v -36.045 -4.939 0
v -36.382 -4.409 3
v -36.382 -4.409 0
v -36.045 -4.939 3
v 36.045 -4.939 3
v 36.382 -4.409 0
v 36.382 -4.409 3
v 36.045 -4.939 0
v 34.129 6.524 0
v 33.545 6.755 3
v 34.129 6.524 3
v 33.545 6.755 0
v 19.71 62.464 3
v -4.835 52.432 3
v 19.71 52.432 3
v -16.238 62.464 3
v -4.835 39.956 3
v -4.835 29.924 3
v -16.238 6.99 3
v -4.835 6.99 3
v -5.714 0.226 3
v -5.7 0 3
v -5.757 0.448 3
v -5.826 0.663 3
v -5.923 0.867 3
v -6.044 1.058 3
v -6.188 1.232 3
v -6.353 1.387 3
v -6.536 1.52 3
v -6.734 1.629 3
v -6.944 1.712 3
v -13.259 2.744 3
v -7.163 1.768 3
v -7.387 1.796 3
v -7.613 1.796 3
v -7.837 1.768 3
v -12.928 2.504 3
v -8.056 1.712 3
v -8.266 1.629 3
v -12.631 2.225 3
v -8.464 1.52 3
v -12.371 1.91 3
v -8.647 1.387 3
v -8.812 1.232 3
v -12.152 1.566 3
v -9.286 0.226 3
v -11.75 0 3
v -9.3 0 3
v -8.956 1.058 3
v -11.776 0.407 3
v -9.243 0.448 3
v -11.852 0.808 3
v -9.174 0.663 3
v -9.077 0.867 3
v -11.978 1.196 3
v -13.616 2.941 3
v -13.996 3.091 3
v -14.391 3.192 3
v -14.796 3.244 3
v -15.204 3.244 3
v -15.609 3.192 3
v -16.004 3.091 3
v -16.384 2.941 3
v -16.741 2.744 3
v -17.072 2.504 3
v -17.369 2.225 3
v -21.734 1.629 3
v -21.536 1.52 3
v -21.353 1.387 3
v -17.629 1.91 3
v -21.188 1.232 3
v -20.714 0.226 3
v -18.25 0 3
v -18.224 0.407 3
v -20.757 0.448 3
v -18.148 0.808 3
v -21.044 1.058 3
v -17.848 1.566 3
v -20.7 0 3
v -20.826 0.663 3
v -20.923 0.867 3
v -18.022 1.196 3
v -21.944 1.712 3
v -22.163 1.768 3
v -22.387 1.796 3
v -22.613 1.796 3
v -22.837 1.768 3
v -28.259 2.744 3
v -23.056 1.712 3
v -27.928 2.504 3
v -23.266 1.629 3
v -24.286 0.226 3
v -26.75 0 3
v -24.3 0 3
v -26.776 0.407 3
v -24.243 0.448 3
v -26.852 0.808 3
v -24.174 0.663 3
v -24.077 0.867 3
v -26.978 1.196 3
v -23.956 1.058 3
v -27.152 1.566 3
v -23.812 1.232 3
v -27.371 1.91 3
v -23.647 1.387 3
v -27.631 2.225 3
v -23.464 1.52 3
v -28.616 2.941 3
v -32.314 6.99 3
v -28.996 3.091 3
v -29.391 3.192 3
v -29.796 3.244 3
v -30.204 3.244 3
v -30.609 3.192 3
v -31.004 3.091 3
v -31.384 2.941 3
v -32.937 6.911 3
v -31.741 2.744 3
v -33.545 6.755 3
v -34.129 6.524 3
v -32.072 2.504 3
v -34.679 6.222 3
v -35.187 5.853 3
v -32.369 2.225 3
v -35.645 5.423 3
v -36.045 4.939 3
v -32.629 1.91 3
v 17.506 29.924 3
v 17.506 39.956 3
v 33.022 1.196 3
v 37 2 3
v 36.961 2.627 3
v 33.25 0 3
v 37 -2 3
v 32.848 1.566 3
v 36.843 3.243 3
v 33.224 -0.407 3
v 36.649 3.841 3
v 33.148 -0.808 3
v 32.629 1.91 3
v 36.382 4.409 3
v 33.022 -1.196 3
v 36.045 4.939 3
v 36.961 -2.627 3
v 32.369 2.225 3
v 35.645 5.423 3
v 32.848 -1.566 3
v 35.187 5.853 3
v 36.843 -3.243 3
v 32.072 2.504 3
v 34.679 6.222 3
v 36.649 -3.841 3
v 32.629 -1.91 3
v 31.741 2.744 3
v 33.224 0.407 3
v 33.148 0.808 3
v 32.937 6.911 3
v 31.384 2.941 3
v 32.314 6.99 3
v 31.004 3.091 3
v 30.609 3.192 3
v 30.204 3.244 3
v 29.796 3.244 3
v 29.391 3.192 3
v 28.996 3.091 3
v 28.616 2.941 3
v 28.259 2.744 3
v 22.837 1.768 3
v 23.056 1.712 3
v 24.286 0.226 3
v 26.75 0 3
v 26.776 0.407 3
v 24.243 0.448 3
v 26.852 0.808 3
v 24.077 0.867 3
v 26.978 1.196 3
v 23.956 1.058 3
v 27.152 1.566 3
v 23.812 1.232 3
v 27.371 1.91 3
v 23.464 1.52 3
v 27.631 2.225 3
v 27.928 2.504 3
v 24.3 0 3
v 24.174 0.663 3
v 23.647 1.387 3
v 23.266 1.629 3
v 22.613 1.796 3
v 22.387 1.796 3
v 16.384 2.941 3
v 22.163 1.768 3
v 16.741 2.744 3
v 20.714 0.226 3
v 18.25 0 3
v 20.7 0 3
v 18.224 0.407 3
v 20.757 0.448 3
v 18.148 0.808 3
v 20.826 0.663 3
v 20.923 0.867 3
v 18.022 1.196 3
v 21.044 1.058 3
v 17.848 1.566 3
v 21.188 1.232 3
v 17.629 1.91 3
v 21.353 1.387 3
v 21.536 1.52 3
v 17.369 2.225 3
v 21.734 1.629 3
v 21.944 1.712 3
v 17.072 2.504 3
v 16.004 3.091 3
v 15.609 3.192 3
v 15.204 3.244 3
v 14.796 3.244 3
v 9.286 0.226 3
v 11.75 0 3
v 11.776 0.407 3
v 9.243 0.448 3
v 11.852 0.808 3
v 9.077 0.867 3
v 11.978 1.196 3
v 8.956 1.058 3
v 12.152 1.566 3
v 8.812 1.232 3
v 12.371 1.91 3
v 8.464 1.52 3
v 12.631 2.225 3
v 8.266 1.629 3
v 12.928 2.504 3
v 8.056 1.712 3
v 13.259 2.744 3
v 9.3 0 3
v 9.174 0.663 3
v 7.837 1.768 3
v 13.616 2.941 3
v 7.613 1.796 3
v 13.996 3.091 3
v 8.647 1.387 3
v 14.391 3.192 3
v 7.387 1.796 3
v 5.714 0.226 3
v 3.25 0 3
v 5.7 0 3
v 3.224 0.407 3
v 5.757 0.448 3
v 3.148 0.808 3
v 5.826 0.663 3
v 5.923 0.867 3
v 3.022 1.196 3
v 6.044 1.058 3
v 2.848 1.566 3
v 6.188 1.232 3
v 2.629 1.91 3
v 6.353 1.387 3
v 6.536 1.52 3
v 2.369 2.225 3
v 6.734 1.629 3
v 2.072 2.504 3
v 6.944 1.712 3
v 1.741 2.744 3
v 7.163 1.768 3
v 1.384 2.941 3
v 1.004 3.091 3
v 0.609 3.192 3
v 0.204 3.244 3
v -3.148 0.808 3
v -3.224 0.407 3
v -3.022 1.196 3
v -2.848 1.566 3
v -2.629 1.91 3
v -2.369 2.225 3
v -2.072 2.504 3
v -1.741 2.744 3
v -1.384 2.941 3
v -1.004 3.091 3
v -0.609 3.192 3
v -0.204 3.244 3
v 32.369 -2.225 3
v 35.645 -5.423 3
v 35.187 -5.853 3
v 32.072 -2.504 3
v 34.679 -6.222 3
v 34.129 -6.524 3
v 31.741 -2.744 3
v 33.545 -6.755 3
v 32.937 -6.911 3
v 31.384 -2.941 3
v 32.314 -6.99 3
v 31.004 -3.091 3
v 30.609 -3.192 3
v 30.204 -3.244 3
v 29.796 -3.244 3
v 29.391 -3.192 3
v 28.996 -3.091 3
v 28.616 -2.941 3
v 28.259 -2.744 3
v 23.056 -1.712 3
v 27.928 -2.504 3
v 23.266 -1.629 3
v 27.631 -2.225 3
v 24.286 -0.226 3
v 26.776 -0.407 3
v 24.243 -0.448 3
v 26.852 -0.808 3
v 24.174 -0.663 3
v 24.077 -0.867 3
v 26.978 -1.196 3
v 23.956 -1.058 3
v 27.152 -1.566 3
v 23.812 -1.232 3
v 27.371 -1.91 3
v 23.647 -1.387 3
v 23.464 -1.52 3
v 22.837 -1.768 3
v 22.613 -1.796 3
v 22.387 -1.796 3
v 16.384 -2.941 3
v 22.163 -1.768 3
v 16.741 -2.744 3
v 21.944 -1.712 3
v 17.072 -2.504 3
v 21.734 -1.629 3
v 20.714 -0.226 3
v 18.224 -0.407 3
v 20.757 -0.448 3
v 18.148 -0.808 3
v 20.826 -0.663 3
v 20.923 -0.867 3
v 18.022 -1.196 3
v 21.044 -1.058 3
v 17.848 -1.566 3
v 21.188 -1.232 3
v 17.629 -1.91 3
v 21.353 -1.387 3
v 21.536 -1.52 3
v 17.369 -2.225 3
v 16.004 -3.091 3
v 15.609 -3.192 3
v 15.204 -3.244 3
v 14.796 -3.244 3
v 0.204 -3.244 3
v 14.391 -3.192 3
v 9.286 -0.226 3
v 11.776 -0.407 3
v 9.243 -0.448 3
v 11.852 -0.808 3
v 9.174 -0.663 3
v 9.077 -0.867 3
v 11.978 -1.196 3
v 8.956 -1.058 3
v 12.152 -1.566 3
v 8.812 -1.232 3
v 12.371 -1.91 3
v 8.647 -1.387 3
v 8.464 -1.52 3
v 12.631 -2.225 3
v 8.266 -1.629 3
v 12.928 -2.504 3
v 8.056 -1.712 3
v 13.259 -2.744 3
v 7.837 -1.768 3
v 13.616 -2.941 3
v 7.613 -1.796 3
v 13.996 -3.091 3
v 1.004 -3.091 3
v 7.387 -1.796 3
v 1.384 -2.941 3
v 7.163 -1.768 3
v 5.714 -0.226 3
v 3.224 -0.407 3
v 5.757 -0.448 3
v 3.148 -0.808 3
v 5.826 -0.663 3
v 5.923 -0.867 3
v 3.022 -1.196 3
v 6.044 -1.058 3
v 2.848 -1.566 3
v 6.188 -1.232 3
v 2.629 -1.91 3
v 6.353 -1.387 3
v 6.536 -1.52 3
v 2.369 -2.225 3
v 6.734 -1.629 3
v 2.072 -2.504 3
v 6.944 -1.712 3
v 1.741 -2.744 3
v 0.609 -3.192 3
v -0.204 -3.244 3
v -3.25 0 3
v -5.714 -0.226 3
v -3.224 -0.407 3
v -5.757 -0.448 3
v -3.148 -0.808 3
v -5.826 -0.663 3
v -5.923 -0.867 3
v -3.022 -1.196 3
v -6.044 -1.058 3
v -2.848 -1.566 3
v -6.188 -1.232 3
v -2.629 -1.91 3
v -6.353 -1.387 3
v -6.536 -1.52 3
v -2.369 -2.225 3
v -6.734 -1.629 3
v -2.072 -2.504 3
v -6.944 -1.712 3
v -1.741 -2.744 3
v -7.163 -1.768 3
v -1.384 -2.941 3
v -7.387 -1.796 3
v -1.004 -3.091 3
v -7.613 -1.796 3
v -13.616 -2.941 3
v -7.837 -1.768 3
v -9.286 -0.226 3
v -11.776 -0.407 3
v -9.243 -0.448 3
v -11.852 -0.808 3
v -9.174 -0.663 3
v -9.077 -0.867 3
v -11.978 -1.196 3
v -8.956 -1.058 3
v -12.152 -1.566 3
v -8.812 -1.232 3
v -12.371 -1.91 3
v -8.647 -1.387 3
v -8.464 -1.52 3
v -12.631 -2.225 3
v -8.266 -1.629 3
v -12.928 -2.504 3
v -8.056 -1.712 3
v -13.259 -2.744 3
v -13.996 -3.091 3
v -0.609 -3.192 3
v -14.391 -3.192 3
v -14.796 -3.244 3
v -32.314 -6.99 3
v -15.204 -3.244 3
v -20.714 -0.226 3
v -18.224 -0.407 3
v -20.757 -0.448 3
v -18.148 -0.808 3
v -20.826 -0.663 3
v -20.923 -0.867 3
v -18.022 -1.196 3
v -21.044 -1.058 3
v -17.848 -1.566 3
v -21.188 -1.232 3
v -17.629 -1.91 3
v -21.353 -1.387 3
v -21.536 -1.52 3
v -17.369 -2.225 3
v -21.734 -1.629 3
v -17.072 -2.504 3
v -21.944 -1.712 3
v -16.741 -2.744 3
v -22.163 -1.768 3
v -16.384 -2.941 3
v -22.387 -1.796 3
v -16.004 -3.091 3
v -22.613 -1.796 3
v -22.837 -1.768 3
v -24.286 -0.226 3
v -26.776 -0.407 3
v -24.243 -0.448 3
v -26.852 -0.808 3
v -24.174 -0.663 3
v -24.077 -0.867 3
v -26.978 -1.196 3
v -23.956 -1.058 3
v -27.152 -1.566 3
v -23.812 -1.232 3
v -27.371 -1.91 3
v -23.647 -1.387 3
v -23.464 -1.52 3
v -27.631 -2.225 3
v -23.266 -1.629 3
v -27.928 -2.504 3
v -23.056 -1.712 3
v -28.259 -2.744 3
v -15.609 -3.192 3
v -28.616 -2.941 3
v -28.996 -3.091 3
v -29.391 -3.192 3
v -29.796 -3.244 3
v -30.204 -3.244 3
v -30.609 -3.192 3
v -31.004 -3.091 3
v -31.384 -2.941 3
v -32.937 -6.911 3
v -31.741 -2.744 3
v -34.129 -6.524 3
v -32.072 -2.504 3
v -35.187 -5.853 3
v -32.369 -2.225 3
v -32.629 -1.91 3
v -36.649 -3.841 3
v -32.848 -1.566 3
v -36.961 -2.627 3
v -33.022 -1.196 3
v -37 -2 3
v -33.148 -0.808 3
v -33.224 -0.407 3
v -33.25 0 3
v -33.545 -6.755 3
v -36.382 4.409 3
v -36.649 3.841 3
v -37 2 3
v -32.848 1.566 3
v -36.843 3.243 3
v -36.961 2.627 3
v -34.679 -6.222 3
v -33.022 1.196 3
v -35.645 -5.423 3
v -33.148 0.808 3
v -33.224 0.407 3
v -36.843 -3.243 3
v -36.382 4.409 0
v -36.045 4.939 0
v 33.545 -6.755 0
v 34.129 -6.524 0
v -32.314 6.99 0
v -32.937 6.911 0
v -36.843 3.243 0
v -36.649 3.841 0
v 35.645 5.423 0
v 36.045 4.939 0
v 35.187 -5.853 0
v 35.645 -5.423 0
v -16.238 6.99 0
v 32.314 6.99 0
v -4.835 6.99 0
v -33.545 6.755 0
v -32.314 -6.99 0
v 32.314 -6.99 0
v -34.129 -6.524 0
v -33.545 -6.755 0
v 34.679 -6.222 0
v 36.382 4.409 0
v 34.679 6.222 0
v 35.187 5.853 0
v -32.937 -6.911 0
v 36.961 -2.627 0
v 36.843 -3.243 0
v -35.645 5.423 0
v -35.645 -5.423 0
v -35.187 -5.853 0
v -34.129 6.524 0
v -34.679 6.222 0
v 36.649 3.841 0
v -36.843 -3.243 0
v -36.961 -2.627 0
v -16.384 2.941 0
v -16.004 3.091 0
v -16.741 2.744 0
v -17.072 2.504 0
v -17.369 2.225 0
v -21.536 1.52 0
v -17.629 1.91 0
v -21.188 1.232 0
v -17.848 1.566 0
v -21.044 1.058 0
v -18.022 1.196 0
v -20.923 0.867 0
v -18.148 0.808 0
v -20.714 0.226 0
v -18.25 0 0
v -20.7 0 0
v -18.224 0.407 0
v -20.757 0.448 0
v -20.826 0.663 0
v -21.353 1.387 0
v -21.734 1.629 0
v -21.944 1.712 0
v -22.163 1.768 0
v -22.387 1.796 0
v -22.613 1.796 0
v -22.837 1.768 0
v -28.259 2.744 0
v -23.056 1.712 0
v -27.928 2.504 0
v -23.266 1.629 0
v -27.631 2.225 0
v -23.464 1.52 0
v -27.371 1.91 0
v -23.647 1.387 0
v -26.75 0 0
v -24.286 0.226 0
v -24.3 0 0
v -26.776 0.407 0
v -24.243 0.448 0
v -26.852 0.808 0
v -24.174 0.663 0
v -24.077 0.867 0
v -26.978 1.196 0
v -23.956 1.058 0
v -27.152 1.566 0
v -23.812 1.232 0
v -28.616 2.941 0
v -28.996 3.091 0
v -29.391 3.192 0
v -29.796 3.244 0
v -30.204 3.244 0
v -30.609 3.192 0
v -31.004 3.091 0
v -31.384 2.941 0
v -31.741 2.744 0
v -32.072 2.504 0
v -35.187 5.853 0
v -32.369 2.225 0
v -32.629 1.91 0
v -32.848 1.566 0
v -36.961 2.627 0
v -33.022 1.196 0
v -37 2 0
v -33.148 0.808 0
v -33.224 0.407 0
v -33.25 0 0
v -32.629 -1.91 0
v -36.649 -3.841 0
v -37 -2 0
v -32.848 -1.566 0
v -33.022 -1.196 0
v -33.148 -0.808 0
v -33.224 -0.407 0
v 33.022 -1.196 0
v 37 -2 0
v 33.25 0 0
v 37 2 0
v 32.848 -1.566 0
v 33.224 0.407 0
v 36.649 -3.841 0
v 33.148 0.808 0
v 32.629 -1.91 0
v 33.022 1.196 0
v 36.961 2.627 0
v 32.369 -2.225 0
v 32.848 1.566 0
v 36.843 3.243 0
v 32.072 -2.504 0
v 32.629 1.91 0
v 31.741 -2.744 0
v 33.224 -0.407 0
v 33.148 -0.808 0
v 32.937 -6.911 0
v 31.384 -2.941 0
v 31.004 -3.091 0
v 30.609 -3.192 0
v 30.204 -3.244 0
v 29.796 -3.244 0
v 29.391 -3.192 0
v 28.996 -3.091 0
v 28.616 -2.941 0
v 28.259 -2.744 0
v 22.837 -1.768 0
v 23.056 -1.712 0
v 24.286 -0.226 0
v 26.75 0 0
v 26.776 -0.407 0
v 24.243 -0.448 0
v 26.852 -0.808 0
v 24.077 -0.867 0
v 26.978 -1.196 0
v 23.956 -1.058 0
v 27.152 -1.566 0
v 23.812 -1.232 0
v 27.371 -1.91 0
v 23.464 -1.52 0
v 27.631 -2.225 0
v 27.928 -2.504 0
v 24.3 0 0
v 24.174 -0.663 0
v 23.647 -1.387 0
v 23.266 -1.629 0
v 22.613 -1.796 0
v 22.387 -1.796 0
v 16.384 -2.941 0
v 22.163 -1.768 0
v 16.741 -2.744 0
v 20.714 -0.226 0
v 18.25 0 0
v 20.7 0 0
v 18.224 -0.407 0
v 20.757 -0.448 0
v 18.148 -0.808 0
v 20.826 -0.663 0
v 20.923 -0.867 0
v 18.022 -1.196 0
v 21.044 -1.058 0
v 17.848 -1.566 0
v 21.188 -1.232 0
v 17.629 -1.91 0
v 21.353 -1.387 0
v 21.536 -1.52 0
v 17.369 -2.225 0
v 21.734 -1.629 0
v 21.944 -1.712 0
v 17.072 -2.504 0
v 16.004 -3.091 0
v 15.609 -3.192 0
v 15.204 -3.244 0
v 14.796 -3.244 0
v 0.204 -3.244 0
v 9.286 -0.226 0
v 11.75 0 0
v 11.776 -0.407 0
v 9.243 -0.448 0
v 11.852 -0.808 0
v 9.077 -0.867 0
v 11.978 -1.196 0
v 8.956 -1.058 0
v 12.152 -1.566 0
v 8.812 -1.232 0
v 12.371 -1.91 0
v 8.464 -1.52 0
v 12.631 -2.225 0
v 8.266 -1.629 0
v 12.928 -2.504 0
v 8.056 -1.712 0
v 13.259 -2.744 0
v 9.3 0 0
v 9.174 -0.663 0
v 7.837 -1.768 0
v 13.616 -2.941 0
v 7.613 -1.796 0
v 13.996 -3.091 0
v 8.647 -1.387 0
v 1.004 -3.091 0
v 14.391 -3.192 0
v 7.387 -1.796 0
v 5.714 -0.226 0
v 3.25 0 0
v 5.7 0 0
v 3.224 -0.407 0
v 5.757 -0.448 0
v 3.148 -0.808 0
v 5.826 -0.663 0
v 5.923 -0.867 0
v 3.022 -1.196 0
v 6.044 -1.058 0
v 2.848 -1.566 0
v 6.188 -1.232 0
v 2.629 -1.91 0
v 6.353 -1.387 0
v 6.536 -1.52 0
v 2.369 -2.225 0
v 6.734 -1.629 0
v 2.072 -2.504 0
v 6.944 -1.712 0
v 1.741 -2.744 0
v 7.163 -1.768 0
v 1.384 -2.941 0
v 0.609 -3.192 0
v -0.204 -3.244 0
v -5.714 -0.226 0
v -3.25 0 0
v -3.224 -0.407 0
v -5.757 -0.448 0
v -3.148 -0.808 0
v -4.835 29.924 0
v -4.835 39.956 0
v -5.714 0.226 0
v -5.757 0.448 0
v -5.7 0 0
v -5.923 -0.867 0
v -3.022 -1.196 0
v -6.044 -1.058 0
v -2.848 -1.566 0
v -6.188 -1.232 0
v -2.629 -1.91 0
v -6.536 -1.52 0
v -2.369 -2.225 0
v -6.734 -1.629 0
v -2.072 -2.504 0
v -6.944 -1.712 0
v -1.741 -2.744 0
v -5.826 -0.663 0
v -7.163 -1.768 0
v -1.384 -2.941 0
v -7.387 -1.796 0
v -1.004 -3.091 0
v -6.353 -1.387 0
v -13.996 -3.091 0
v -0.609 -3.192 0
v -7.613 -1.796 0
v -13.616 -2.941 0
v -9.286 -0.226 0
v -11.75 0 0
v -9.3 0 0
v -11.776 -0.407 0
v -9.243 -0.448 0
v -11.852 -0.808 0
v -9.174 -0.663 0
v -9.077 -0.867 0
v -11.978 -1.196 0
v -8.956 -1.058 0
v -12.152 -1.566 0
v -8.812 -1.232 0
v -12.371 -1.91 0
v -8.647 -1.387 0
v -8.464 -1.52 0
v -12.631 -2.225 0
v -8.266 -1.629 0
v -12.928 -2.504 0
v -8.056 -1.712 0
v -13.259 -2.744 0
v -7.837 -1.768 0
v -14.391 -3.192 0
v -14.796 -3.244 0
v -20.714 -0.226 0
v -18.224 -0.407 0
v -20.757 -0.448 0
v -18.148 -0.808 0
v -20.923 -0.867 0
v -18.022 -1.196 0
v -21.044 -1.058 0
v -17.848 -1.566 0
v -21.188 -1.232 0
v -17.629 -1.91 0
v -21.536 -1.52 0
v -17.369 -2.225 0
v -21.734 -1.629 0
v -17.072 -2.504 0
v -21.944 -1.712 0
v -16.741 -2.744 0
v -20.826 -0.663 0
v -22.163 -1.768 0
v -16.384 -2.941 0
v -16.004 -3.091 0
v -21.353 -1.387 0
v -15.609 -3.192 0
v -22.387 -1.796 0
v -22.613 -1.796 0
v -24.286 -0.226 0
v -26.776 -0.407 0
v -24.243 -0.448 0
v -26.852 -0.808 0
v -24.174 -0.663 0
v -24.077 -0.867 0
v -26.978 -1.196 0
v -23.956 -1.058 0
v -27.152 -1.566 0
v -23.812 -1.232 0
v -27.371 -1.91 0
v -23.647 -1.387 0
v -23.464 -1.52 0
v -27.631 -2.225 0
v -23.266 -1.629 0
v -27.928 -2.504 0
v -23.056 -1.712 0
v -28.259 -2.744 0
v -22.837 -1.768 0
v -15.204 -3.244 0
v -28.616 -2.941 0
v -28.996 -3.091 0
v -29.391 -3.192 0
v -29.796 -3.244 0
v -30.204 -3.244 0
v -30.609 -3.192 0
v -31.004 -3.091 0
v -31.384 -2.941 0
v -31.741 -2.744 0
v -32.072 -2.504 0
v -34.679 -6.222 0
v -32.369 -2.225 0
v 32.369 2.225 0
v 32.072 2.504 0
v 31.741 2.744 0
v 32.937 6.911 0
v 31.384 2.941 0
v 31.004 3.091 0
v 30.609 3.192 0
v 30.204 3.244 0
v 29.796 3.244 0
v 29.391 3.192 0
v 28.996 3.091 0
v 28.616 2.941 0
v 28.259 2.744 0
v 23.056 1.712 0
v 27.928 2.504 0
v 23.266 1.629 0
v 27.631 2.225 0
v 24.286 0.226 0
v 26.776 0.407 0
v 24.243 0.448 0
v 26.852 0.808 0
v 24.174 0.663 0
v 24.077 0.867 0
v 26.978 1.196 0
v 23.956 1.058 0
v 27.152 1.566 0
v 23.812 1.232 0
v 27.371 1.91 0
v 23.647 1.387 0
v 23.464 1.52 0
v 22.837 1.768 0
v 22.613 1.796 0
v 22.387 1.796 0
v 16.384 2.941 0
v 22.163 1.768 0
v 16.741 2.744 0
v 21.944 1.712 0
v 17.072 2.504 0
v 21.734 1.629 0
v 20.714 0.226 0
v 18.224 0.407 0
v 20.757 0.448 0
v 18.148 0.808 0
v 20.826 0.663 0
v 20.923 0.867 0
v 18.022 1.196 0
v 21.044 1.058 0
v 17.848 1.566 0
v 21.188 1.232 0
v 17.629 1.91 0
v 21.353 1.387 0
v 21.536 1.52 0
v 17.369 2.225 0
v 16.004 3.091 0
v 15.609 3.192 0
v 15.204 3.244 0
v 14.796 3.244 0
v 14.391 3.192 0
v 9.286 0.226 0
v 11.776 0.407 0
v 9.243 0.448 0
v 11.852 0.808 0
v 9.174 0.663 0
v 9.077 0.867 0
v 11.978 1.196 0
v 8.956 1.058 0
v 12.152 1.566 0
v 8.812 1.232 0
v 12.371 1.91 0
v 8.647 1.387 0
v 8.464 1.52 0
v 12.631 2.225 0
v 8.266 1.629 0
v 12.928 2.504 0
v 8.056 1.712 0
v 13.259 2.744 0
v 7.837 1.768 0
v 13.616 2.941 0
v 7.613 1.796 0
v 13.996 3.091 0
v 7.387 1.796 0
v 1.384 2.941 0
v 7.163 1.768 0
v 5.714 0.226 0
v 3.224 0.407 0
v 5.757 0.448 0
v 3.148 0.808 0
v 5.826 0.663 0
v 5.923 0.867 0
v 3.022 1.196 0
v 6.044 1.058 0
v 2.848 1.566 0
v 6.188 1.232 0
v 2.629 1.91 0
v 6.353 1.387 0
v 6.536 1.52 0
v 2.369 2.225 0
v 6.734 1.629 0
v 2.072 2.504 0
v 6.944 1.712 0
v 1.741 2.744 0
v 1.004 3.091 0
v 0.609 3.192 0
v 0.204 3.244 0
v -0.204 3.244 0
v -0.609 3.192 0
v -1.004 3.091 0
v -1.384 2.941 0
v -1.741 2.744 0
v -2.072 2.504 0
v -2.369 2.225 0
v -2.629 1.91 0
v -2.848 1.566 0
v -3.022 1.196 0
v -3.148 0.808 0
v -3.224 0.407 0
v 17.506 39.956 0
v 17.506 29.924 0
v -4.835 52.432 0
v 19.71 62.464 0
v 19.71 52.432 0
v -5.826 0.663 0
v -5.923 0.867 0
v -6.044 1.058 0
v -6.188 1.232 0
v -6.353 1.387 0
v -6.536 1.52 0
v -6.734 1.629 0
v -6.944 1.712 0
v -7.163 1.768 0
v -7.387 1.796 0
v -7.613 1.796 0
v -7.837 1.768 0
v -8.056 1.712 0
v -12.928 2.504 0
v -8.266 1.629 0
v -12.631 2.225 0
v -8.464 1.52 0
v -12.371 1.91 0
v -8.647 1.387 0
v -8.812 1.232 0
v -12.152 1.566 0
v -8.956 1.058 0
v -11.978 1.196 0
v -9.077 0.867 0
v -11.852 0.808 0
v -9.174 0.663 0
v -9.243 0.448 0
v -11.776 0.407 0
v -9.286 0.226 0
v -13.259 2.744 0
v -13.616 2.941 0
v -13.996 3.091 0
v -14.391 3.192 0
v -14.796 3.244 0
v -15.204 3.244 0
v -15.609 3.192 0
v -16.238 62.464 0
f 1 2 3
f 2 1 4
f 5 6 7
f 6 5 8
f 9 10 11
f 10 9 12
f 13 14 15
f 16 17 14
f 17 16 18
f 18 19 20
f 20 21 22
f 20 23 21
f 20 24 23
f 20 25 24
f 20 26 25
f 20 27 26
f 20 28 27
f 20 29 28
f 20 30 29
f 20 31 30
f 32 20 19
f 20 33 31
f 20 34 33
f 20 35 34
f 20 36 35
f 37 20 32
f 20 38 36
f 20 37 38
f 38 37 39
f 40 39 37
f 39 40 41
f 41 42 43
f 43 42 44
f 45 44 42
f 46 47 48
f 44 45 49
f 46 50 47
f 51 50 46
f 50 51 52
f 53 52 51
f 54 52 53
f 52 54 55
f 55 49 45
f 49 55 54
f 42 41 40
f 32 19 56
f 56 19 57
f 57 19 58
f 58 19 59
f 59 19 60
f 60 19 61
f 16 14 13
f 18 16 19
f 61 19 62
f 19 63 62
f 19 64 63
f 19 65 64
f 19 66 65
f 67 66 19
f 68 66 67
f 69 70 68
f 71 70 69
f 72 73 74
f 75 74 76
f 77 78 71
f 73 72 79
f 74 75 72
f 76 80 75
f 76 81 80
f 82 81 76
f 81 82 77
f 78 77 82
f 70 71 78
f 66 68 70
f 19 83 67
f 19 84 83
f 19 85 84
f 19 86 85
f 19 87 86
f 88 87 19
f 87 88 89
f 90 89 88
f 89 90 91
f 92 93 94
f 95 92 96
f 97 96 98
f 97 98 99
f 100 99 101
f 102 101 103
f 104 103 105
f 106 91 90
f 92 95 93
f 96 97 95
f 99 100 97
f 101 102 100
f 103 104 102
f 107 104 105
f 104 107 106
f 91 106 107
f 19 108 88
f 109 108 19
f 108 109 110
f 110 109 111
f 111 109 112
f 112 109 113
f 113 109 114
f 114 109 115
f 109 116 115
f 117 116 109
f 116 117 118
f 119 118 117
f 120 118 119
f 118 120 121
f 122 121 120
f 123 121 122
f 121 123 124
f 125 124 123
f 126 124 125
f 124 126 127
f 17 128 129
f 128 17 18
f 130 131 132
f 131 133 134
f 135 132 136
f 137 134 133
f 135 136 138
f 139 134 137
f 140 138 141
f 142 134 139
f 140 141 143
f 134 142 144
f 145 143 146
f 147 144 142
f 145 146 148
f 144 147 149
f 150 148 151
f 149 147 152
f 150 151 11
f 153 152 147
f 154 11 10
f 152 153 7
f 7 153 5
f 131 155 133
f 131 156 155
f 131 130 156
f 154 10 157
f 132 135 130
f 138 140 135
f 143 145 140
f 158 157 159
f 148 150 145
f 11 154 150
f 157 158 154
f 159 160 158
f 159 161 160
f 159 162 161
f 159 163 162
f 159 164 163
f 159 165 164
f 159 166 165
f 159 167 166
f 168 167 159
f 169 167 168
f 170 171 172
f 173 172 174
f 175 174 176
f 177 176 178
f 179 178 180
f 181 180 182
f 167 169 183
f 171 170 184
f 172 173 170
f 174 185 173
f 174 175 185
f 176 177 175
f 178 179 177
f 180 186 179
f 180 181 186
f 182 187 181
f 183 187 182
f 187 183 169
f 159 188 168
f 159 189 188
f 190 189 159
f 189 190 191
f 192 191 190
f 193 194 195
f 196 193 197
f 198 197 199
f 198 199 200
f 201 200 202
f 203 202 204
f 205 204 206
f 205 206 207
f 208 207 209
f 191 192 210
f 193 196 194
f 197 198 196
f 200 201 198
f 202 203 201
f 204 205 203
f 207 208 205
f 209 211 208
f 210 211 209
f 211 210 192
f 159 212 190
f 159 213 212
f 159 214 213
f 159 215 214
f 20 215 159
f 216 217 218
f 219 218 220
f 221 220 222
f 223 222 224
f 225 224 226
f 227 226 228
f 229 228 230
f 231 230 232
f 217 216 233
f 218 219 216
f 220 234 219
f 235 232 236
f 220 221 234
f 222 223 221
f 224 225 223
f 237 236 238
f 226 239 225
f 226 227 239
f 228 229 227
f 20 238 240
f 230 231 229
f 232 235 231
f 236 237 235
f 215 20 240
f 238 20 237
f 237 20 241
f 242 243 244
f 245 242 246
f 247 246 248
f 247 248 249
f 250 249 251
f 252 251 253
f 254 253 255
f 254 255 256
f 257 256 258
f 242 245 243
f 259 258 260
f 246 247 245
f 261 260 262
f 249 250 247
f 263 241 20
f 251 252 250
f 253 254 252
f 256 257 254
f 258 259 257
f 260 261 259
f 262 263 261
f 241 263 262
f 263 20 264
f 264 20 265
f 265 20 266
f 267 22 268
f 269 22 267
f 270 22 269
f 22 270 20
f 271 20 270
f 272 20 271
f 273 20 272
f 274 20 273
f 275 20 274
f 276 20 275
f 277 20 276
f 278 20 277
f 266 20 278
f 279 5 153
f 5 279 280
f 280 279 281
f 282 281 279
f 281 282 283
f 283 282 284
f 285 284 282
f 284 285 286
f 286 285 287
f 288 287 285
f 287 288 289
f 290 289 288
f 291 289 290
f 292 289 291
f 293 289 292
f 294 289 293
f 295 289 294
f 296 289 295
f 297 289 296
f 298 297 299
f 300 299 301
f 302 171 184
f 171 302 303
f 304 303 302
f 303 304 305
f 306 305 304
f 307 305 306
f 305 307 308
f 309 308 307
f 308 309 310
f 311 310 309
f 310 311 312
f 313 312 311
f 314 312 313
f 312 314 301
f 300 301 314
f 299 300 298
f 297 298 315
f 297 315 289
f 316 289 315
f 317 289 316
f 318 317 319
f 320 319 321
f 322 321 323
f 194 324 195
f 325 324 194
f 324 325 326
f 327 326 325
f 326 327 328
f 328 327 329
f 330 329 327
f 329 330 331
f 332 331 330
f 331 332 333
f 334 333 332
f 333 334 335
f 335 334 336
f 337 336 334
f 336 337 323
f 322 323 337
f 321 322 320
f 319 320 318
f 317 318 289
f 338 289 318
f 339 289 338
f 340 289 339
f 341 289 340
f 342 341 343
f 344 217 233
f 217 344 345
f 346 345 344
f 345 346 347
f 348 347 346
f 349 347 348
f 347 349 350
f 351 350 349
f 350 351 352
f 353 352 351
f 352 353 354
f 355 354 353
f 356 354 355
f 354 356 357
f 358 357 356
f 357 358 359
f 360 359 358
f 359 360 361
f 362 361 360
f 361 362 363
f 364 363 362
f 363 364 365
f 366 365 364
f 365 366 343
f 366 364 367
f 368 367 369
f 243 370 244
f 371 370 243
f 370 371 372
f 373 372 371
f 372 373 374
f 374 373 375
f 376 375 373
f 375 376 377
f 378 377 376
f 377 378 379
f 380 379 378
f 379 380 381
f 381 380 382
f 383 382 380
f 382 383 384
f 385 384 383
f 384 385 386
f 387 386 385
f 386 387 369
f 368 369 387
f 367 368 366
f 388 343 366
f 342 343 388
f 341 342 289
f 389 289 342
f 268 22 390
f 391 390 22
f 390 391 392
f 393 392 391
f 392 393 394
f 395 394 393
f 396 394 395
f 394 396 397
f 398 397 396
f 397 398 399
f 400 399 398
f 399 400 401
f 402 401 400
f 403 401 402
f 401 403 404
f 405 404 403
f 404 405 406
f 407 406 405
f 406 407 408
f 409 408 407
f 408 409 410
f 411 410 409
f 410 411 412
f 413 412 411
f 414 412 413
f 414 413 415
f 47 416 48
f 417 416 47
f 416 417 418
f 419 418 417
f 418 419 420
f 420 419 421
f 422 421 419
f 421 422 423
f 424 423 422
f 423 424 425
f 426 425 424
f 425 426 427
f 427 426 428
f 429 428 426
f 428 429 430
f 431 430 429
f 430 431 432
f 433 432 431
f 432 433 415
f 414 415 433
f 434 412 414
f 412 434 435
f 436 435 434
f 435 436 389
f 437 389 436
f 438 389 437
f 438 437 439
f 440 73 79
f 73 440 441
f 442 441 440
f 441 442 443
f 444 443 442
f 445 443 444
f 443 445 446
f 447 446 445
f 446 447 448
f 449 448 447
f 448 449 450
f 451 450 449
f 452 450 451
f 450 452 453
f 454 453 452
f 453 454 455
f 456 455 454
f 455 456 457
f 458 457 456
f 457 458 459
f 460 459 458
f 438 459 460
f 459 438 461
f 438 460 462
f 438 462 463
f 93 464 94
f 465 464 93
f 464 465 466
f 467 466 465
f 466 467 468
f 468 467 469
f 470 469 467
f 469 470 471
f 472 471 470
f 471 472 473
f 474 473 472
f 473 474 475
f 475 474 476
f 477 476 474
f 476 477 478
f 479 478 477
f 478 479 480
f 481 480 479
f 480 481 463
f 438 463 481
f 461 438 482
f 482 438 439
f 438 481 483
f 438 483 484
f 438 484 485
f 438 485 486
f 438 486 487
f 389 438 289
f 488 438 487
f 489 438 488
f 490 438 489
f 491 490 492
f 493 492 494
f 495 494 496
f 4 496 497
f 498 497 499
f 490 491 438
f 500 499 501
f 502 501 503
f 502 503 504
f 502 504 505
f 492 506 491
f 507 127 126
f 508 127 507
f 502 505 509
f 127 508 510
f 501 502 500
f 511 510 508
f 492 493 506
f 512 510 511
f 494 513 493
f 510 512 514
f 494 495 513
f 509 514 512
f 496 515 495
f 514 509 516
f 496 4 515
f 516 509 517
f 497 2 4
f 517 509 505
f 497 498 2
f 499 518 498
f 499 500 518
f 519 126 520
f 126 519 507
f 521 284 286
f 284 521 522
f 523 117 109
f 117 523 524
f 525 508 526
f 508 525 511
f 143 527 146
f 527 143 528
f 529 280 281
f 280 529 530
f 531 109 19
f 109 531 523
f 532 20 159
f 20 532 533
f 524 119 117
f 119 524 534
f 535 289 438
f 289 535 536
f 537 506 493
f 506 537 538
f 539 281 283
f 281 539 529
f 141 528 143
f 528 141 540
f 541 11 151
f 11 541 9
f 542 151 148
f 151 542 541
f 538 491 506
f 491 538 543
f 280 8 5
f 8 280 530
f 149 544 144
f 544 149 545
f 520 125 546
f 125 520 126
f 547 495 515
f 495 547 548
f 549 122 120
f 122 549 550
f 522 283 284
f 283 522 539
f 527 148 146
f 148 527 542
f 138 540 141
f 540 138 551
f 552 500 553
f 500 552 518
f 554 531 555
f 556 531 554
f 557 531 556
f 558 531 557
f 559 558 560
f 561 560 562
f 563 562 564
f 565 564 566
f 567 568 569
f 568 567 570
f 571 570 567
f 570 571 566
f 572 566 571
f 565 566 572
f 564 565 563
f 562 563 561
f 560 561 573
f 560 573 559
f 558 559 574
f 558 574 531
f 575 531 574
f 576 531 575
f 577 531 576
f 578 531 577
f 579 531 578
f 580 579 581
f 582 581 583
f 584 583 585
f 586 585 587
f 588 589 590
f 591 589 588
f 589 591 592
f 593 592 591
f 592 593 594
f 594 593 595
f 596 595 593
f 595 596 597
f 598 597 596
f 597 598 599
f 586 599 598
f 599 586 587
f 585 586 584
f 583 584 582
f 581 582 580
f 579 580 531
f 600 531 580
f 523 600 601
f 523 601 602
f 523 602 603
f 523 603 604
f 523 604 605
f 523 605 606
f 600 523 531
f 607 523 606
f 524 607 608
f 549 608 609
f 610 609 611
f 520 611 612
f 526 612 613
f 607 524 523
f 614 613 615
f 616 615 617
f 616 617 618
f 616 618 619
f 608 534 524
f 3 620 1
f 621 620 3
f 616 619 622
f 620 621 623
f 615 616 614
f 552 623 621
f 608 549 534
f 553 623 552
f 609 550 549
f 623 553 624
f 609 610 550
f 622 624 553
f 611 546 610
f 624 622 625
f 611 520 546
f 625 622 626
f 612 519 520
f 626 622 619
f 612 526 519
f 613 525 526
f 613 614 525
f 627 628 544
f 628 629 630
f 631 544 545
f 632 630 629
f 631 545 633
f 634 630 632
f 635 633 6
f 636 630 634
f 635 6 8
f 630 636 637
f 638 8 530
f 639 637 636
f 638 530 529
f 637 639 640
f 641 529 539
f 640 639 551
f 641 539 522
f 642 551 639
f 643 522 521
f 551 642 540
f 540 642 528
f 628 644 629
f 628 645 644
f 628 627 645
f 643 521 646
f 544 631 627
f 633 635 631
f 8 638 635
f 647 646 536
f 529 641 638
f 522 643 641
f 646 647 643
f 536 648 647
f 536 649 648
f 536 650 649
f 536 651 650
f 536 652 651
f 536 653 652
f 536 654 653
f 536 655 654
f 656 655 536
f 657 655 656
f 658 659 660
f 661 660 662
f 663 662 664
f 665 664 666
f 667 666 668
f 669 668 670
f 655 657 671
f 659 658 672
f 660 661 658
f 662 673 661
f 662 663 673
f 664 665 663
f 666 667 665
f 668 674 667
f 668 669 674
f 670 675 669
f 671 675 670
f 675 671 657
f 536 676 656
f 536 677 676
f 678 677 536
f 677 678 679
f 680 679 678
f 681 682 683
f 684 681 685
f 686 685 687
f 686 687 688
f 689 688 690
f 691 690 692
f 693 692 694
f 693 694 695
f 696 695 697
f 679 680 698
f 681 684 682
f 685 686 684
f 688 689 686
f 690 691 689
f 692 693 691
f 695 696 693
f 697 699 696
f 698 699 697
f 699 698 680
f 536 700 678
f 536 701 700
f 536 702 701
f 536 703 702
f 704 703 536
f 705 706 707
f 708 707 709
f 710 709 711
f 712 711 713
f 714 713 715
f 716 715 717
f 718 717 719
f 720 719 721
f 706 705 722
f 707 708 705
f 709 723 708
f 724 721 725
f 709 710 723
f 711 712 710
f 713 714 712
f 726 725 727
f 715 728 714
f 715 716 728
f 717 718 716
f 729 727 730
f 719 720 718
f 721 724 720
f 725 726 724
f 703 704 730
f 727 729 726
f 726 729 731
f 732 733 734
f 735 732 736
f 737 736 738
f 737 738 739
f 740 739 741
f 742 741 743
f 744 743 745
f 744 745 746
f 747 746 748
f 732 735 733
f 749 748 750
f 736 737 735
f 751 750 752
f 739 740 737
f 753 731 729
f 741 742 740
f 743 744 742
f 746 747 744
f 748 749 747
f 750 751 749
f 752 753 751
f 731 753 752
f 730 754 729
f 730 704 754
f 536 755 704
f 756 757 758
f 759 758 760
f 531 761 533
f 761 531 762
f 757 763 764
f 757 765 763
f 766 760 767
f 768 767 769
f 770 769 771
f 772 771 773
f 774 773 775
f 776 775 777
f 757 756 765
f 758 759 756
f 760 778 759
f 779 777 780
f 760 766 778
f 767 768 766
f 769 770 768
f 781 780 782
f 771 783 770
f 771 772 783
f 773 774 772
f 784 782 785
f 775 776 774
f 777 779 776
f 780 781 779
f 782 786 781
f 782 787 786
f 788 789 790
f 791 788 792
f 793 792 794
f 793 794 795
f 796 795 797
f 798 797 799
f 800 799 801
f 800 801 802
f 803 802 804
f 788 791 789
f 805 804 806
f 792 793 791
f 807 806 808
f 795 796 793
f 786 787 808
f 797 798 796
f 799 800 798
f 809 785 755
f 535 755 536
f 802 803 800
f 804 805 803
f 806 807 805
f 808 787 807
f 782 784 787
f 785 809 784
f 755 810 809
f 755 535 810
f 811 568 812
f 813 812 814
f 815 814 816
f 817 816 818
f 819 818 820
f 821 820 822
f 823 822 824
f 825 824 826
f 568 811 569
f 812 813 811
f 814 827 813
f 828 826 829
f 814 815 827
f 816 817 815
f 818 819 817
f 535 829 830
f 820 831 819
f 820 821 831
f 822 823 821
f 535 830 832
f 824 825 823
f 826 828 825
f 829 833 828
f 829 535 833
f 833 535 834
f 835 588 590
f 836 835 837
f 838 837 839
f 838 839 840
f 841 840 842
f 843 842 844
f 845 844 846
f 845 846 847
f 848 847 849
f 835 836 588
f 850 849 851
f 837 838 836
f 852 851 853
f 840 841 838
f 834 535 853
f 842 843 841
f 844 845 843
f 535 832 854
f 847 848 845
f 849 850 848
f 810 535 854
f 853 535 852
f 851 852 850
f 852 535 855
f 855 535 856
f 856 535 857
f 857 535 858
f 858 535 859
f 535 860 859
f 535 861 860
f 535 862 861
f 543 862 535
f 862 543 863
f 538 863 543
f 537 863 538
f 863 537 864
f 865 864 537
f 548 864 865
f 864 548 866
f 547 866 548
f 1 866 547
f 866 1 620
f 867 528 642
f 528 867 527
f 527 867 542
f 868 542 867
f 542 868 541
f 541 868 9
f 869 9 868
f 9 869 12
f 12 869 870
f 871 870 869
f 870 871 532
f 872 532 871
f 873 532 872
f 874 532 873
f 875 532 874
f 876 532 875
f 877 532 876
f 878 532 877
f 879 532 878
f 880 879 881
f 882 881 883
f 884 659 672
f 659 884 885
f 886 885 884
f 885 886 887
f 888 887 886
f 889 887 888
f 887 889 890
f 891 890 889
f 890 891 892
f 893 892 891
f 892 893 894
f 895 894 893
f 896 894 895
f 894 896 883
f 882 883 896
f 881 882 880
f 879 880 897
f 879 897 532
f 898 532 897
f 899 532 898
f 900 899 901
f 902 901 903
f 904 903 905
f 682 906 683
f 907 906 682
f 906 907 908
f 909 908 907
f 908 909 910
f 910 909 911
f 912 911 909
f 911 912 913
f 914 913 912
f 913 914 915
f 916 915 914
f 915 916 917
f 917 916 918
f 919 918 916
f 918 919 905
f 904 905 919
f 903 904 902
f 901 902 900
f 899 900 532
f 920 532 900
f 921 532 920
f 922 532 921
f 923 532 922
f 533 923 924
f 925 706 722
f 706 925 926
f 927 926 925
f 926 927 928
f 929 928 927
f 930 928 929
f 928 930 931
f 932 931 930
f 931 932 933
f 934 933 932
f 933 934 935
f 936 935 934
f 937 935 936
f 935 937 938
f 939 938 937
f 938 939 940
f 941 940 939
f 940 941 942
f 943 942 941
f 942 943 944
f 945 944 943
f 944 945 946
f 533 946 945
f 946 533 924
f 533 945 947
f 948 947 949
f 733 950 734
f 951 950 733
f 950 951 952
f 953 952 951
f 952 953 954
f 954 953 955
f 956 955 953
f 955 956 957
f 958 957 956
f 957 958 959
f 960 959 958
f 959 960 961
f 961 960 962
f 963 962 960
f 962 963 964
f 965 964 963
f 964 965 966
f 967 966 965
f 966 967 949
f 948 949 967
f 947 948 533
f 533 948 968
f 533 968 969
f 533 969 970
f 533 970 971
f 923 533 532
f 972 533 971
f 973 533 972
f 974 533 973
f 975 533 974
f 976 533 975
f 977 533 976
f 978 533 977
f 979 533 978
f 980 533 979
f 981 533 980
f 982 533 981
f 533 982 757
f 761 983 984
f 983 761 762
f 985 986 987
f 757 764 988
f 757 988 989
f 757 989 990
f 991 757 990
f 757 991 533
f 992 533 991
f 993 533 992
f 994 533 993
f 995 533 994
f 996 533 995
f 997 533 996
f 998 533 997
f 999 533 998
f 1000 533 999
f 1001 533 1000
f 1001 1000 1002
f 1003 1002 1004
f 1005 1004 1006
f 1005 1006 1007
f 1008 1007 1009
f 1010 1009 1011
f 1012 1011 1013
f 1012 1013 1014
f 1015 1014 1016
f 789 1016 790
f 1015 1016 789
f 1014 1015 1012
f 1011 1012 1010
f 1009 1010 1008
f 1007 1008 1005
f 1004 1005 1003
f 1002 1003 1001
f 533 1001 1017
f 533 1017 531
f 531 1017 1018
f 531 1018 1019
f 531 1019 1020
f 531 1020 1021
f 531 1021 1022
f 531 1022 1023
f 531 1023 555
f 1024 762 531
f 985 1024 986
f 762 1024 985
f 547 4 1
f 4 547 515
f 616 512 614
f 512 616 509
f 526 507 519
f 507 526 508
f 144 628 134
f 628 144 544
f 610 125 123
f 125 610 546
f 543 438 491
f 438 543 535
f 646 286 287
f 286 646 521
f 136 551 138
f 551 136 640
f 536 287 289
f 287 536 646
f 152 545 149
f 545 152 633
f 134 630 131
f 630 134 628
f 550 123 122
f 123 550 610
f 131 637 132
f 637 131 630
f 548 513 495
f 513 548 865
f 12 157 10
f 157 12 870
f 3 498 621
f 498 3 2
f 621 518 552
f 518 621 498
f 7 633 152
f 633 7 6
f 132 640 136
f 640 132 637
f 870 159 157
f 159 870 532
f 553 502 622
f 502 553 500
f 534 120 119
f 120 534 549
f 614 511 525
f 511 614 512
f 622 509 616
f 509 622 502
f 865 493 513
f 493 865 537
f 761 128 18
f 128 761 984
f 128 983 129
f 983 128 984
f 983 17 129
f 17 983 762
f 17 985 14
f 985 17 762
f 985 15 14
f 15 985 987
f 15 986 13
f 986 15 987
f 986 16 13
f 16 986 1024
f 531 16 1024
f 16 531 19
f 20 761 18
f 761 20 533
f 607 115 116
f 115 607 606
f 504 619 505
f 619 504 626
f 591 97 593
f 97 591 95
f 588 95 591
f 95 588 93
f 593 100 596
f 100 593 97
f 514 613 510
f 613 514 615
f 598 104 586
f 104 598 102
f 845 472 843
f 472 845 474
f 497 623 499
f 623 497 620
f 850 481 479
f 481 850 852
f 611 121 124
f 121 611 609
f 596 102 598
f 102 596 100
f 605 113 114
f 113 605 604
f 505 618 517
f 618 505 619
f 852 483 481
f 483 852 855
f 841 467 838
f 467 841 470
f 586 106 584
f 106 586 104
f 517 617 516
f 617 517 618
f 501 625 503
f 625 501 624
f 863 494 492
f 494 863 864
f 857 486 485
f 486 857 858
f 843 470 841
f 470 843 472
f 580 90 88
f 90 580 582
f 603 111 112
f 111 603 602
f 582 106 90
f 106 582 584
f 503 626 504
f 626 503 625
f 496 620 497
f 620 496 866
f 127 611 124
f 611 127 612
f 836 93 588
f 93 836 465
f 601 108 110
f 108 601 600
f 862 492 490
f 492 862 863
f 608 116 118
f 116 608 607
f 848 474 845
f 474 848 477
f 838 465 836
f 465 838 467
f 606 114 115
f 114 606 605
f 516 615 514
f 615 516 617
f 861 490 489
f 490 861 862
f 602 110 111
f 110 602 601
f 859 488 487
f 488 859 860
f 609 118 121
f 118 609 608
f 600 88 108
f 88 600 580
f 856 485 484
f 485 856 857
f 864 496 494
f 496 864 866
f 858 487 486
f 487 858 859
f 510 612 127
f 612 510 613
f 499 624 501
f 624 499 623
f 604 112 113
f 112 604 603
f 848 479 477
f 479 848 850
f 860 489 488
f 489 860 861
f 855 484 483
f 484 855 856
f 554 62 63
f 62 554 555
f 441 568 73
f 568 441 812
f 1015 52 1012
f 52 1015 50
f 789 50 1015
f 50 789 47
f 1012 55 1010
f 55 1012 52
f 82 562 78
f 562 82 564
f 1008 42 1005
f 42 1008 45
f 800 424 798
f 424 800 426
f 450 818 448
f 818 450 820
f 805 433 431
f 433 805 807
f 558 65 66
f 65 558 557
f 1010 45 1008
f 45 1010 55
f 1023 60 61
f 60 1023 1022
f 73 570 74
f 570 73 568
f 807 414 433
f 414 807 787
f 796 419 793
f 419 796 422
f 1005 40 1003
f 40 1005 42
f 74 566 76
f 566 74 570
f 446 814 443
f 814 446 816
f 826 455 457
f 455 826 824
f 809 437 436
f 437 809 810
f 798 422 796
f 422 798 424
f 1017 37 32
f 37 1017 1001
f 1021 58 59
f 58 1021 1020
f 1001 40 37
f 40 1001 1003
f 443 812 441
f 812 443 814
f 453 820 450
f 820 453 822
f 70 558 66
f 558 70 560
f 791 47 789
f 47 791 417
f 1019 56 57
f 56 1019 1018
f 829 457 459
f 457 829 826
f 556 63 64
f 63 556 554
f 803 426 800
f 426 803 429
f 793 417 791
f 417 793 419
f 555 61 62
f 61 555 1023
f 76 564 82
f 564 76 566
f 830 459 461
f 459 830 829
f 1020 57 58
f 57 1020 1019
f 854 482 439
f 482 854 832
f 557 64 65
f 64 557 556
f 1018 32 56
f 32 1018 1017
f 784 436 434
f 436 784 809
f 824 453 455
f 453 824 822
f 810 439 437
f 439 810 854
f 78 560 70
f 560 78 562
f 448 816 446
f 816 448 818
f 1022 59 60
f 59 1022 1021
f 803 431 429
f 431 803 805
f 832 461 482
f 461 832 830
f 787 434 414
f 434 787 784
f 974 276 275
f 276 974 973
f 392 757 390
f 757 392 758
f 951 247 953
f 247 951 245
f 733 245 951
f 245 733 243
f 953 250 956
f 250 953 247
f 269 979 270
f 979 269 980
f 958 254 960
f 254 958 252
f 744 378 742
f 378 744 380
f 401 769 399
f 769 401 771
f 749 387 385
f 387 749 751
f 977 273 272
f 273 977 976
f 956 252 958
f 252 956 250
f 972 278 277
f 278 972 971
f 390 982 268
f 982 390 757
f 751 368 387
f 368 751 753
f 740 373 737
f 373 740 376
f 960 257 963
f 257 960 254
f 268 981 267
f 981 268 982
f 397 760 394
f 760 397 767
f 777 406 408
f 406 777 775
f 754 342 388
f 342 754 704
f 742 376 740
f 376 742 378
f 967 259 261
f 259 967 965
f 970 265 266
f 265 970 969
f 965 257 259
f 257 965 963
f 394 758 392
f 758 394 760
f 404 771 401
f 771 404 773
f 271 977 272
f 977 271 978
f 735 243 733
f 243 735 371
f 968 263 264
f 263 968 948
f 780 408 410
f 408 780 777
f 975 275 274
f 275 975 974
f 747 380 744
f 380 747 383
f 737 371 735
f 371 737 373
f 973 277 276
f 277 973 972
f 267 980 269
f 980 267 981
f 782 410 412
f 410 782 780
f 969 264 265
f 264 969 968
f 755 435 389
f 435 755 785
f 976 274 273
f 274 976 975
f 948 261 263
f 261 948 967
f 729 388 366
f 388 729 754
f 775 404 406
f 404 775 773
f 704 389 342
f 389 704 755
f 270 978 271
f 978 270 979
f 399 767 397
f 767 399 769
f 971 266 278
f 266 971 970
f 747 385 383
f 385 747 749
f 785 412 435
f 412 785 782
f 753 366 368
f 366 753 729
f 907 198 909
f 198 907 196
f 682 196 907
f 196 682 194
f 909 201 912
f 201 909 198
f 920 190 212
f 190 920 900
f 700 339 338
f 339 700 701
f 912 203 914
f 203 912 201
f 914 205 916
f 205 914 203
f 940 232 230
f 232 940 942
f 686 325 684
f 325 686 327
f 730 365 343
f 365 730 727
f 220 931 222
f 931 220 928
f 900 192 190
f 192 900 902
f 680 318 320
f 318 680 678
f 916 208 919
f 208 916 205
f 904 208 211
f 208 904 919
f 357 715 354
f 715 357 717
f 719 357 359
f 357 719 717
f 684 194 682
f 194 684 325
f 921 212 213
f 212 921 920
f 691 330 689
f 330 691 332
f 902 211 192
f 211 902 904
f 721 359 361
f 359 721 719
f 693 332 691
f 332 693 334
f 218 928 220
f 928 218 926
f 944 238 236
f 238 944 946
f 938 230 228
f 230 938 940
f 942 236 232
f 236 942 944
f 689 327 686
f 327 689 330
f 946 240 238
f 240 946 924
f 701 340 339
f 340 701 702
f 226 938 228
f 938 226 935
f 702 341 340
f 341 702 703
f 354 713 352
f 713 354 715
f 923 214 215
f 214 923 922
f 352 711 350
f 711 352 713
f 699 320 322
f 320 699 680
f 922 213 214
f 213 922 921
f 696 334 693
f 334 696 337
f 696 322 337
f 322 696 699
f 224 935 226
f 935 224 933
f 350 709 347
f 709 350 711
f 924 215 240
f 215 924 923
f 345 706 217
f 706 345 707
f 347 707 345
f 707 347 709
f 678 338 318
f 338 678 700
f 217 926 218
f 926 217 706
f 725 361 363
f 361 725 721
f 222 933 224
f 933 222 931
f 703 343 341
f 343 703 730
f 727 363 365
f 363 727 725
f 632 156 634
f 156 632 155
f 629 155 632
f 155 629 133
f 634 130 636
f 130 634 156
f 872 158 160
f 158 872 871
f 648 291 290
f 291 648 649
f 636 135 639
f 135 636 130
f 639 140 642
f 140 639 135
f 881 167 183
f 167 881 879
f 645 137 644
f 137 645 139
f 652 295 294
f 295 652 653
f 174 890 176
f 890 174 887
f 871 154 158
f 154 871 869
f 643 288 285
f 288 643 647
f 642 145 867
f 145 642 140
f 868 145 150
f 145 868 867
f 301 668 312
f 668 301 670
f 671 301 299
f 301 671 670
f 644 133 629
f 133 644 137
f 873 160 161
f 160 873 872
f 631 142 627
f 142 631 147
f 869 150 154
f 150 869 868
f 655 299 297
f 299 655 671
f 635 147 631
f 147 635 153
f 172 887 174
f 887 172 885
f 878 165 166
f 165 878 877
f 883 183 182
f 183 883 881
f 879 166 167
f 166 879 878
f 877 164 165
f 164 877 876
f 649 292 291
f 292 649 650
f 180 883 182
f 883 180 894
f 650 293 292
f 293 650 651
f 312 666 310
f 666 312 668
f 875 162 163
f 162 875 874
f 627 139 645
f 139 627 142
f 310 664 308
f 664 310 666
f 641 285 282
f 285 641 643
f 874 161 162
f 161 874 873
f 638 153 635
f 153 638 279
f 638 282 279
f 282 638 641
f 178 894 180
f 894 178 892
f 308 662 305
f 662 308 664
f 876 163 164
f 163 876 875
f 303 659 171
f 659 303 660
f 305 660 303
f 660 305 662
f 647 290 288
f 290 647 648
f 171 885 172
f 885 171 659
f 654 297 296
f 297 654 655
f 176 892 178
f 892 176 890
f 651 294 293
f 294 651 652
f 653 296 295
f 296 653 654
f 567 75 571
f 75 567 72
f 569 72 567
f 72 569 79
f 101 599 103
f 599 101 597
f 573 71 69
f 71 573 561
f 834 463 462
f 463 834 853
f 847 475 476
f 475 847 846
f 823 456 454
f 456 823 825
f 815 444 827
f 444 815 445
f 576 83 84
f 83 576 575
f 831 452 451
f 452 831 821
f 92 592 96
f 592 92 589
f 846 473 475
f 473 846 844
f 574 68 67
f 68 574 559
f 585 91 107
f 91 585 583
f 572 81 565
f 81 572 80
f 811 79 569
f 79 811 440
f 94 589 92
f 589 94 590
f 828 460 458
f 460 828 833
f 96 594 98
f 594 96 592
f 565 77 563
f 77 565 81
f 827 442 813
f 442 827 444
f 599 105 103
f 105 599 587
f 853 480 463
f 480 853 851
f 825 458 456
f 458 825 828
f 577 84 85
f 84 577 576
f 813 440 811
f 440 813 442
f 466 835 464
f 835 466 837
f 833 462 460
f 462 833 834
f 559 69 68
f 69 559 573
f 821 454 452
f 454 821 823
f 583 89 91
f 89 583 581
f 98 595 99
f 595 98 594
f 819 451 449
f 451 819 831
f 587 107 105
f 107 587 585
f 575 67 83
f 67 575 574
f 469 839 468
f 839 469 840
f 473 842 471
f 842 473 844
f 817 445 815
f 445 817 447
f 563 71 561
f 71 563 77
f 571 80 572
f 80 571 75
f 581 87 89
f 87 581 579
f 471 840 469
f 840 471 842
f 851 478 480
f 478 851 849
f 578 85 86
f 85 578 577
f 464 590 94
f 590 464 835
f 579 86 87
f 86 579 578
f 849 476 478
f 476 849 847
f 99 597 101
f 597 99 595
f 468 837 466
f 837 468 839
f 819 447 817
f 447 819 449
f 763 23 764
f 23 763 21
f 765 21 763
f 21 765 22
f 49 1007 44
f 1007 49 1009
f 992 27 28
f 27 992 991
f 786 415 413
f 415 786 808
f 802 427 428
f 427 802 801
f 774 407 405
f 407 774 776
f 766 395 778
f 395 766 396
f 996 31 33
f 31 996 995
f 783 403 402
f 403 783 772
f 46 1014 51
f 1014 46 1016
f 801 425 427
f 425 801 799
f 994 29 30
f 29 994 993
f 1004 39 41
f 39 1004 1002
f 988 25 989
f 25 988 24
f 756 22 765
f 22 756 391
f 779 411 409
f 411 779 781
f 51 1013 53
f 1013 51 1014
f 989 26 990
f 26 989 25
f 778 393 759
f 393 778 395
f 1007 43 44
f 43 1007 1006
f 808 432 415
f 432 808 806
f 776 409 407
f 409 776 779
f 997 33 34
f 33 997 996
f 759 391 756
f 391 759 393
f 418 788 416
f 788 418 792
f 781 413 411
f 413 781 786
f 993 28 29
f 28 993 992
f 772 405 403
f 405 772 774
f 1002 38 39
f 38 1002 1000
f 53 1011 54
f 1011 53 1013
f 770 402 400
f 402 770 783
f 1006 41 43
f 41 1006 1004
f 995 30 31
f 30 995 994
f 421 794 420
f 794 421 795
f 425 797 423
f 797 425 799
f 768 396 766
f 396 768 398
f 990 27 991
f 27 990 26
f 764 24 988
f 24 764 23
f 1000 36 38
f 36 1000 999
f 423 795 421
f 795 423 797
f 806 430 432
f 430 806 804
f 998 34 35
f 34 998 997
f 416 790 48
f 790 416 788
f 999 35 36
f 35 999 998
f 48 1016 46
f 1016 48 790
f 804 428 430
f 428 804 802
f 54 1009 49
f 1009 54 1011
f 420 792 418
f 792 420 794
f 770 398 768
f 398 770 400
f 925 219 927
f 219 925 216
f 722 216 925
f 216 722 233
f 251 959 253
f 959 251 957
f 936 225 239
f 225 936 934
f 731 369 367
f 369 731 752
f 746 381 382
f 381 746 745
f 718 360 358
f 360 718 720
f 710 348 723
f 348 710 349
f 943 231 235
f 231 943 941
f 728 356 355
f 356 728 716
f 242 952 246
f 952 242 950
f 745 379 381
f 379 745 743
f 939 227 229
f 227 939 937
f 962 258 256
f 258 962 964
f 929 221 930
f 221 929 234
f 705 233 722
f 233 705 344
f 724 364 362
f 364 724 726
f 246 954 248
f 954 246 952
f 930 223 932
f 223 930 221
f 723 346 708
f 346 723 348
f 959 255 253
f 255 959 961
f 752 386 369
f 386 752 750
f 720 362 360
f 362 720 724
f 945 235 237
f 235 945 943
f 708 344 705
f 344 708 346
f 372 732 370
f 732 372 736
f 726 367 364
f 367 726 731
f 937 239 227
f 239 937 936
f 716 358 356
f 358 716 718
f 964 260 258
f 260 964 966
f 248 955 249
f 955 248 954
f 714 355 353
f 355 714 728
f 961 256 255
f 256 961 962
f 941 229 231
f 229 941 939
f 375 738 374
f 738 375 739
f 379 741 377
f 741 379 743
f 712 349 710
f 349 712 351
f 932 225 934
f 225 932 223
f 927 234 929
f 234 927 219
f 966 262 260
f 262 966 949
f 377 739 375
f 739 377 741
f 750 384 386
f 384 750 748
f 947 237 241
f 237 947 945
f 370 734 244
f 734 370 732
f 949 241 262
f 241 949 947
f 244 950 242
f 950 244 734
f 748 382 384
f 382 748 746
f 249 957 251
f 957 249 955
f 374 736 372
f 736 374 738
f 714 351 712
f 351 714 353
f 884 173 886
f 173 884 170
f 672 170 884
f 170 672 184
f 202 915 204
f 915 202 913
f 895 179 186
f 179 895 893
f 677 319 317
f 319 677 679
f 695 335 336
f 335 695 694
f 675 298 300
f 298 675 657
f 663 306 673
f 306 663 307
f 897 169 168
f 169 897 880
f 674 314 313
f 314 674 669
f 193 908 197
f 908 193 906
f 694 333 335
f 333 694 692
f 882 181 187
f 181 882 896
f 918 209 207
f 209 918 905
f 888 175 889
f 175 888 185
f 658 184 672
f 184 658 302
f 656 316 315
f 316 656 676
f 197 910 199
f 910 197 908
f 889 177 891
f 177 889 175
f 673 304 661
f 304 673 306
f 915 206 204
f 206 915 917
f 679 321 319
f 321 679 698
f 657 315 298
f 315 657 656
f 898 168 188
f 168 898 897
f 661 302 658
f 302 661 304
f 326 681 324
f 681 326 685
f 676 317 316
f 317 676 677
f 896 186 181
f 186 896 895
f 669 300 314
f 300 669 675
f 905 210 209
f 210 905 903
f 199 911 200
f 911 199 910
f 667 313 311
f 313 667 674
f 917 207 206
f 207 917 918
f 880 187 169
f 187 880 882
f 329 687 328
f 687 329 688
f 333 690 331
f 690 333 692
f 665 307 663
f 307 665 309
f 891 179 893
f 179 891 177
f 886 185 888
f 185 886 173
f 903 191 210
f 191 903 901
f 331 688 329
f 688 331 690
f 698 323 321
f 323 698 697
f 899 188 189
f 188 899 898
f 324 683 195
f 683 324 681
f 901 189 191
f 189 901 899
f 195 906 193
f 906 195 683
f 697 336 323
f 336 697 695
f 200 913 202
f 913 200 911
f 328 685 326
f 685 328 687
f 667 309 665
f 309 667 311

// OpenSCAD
$fn = 50;


difference() {
	union() {
		hull() {
			translate(v = [-32.0000000000, 2.0000000000, 0]) {
				cylinder(h = 3, r = 5);
			}
			translate(v = [32.0000000000, 2.0000000000, 0]) {
				cylinder(h = 3, r = 5);
			}
			translate(v = [-32.0000000000, -2.0000000000, 0]) {
				cylinder(h = 3, r = 5);
			}
			translate(v = [32.0000000000, -2.0000000000, 0]) {
				cylinder(h = 3, r = 5);
			}
		}
		translate(v = [0, 61.1111111111, 0]) {
			linear_extrude(height = 3) {
				text(font = "DejaVu Sans Mono:style=Bold", halign = "center", size = 57.0000000000, text = "F", valign = "top");
			}
		}
	}
	union() {
		translate(v = [-30.0000000000, 0.0000000000, 0]) {
			translate(v = [0, 0, -100]) {
				cylinder(h = 200, r = 3.2500000000);
			}
		}
		translate(v = [-15.0000000000, 0.0000000000, 0]) {
			translate(v = [0, 0, -100]) {
				cylinder(h = 200, r = 3.2500000000);
			}
		}
		translate(v = [0, 0, -100]) {
			cylinder(h = 200, r = 3.2500000000);
		}
		translate(v = [15.0000000000, 0.0000000000, 0]) {
			translate(v = [0, 0, -100]) {
				cylinder(h = 200, r = 3.2500000000);
			}
		}
		translate(v = [30.0000000000, 0.0000000000, 0]) {
			translate(v = [0, 0, -100]) {
				cylinder(h = 200, r = 3.2500000000);
			}
		}
		translate(v = [-30.0000000000, 0.0000000000, 0]) {
			translate(v = [0, 0, -100]) {
				cylinder(h = 200, r = 1.8000000000);
			}
		}
		translate(v = [-22.5000000000, 0.0000000000, 0]) {
			translate(v = [0, 0, -100]) {
				cylinder(h = 200, r = 1.8000000000);
			}
		}
		translate(v = [-15.0000000000, 0.0000000000, 0]) {
			translate(v = [0, 0, -100]) {
				cylinder(h = 200, r = 1.8000000000);
			}
		}
		translate(v = [-7.5000000000, 0.0000000000, 0]) {
			translate(v = [0, 0, -100]) {
				cylinder(h = 200, r = 1.8000000000);
			}
		}
		translate(v = [0, 0, -100]) {
			cylinder(h = 200, r = 1.8000000000);
		}
		translate(v = [7.5000000000, 0.0000000000, 0]) {
			translate(v = [0, 0, -100]) {
				cylinder(h = 200, r = 1.8000000000);
			}
		}
		translate(v = [15.0000000000, 0.0000000000, 0]) {
			translate(v = [0, 0, -100]) {
				cylinder(h = 200, r = 1.8000000000);
			}
		}
		translate(v = [22.5000000000, 0.0000000000, 0]) {
			translate(v = [0, 0, -100]) {
				cylinder(h = 200, r = 1.8000000000);
			}
		}
		translate(v = [30.0000000000, 0.0000000000, 0]) {
			translate(v = [0, 0, -100]) {
				cylinder(h = 200, r = 1.8000000000);
			}
		}
	}
}
